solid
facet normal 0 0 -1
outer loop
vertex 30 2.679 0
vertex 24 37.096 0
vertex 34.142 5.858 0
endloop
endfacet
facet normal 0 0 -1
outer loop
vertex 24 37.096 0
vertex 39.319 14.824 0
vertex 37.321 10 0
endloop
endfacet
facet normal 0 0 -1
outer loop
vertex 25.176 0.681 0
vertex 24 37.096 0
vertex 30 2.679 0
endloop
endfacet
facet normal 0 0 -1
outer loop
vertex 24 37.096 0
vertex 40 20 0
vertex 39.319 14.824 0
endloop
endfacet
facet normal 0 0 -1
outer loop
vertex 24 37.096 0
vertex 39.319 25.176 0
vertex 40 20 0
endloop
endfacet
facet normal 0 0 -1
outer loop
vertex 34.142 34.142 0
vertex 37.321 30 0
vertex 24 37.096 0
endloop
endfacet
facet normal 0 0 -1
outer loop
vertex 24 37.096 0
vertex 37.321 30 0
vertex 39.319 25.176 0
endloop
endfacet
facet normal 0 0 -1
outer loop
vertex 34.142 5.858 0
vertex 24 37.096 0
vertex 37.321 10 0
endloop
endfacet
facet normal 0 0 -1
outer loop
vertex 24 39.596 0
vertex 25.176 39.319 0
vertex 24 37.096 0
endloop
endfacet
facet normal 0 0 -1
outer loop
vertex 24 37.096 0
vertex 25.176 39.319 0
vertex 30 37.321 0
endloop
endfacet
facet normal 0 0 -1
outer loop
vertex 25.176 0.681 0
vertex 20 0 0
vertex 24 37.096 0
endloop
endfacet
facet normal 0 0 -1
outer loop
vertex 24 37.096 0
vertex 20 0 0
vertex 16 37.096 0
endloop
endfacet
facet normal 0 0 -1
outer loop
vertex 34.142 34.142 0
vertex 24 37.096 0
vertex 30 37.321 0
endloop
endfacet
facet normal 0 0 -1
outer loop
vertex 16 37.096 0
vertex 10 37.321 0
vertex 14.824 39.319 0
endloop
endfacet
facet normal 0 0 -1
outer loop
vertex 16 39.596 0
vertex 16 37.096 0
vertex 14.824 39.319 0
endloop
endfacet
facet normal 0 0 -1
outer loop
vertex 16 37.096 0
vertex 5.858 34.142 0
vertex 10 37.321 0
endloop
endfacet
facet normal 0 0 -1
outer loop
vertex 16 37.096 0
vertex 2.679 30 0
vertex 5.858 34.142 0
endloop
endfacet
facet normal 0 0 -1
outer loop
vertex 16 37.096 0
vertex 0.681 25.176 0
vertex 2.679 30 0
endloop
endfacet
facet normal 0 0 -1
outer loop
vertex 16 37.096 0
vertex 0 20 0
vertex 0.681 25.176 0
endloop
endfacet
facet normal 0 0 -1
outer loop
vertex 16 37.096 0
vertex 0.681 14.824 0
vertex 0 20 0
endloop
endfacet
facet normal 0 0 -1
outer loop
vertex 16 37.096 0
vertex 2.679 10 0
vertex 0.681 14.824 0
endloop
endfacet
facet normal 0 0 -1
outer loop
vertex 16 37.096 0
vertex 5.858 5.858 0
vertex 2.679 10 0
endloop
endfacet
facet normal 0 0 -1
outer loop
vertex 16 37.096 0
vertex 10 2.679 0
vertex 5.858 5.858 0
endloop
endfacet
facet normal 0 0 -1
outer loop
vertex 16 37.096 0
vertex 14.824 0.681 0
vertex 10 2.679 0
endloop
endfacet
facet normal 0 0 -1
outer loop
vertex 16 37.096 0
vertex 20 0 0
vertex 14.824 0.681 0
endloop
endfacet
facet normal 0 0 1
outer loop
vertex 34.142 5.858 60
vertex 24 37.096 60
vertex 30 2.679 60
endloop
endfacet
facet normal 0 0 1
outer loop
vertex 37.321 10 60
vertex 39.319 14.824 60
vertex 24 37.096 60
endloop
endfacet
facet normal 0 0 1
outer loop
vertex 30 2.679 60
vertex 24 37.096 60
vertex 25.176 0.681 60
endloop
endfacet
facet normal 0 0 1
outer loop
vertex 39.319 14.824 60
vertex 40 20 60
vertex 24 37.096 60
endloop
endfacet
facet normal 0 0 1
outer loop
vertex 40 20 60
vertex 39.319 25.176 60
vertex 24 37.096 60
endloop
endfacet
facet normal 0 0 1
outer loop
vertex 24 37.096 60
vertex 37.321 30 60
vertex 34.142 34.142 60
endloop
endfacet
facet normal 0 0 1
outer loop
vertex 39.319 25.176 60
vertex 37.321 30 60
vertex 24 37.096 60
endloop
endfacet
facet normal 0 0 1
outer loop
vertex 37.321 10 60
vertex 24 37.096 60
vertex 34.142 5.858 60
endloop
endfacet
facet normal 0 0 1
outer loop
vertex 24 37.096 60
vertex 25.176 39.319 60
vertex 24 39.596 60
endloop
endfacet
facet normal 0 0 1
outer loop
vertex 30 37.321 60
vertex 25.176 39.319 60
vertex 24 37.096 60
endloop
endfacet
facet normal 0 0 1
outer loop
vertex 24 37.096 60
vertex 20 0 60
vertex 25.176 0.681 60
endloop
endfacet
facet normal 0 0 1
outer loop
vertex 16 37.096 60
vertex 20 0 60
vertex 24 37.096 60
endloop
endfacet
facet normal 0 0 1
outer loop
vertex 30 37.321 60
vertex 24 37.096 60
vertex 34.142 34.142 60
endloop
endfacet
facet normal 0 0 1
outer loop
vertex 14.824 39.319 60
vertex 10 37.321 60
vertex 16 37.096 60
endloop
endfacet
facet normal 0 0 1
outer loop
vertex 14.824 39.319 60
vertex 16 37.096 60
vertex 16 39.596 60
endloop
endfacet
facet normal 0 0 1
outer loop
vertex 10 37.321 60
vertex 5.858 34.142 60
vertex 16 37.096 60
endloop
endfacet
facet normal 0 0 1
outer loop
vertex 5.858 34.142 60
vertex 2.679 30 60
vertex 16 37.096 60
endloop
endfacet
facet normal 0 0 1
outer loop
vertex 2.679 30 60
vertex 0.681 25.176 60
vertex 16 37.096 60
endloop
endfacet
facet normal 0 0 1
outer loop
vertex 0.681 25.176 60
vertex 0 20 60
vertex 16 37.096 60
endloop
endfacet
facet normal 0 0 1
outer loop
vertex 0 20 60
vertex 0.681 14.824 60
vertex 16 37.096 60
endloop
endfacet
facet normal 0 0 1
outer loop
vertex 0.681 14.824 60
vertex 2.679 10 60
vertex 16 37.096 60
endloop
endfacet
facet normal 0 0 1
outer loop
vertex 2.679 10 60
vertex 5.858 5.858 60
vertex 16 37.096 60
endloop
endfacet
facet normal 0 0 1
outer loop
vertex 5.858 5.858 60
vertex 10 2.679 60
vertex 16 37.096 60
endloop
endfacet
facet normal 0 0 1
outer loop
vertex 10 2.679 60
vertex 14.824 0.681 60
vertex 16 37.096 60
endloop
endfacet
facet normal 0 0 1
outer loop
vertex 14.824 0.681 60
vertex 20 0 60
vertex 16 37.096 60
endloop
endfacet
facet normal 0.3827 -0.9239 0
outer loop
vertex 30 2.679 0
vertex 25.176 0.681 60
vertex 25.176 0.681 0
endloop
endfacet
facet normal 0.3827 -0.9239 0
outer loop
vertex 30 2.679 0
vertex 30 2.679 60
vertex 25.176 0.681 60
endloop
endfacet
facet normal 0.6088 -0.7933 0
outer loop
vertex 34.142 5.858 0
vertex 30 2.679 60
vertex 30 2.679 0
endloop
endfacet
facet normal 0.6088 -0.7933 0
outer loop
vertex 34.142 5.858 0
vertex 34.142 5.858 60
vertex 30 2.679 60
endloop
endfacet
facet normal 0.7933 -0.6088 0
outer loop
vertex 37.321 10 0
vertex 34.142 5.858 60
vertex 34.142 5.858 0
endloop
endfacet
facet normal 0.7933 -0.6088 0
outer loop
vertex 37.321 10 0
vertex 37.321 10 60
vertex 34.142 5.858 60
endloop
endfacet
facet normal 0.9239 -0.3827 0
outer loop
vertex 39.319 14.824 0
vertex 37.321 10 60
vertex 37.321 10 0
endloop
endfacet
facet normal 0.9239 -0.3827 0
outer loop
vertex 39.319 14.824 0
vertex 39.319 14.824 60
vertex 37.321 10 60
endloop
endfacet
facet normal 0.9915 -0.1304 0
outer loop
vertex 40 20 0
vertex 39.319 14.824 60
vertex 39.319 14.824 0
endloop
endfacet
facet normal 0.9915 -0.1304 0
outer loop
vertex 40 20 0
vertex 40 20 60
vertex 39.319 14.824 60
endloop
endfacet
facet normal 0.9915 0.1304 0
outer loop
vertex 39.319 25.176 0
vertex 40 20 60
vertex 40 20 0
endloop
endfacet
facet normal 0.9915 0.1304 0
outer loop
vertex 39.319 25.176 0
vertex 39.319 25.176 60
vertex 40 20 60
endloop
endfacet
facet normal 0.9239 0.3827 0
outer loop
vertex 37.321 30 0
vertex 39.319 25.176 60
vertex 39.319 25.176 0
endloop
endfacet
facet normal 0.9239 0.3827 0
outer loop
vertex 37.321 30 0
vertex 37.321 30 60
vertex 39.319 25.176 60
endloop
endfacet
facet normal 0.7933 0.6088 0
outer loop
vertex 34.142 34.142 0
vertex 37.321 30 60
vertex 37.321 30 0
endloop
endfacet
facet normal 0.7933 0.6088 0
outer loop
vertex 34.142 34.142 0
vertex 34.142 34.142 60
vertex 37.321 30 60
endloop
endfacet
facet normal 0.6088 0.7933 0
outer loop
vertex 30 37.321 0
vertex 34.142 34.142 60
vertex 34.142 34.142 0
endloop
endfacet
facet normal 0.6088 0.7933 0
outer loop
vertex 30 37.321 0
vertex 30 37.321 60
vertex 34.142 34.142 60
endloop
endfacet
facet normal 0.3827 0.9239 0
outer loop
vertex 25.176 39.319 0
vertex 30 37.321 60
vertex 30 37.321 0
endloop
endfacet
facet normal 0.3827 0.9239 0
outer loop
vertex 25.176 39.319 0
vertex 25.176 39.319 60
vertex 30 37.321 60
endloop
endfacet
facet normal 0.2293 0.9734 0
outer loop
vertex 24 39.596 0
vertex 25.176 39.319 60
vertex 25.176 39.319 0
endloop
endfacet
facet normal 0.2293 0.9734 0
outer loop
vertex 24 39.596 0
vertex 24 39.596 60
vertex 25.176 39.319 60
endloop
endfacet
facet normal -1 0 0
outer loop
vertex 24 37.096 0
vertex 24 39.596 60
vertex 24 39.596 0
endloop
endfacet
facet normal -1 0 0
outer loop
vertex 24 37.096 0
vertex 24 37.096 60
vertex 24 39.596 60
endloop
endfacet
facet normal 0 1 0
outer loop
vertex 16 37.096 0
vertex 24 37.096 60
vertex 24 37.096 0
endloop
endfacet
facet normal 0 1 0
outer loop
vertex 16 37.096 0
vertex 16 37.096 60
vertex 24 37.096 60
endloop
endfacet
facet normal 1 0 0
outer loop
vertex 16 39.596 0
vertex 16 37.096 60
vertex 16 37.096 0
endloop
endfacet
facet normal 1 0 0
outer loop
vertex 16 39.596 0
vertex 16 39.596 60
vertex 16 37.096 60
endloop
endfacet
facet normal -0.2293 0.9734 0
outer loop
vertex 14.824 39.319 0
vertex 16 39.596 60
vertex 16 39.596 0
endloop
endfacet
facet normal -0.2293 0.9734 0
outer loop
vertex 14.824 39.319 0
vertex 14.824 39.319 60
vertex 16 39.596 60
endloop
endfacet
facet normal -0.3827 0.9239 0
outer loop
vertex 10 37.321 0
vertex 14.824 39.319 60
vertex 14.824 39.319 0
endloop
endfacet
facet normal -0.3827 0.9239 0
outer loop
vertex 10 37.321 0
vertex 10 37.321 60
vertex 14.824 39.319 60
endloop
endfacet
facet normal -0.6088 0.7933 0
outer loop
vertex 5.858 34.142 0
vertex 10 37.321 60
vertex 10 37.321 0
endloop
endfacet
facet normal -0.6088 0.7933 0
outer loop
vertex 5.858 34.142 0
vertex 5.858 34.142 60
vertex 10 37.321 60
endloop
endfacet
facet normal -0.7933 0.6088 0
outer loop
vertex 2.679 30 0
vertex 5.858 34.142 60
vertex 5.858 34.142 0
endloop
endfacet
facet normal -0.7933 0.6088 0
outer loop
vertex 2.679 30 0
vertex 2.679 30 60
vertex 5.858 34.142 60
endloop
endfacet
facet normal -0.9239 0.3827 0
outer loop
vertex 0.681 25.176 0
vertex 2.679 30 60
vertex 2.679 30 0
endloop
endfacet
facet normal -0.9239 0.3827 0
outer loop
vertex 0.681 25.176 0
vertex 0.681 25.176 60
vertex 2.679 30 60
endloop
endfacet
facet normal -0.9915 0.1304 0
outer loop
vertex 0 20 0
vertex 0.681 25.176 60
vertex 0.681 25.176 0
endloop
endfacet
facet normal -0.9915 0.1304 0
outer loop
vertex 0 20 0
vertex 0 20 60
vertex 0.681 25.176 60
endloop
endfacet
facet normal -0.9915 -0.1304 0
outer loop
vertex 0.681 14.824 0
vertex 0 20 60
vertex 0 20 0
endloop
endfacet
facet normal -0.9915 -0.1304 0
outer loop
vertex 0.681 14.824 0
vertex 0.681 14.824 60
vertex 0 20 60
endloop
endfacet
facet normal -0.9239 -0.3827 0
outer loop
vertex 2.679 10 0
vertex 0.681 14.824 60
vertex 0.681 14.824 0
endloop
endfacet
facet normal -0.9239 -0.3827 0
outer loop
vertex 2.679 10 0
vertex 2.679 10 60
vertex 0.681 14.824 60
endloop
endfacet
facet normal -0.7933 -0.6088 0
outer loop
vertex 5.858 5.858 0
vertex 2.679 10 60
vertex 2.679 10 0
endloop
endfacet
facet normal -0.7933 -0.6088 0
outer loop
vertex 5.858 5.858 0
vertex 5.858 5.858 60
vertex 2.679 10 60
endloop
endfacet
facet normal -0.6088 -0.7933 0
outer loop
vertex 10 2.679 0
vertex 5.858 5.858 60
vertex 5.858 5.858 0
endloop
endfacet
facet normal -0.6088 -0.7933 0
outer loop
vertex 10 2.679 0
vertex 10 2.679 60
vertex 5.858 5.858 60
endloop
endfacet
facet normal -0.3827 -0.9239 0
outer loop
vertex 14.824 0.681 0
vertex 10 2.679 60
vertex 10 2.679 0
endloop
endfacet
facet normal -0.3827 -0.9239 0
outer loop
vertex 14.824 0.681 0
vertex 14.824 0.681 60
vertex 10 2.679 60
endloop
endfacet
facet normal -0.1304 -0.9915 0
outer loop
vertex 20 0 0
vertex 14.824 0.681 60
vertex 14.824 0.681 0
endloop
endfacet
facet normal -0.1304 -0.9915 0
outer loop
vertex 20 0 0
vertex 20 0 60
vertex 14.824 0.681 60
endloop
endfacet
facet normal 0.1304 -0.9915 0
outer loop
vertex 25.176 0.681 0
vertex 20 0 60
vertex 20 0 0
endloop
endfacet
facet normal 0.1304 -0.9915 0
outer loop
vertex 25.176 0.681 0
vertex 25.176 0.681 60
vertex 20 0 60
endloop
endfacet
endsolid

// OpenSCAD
$fn = 32;

// ----------------------------------------------------------------------
// Keyway shaft: d40 shaft, key 8 x 2.5 mm
// ----------------------------------------------------------------------

// --- parameters (mm) ---
shaft_r = 20;             // shaft radius
key_w = 8;                // keyway width
key_d = 2.5;              // keyway depth below the surface line
plate_t = 60;             // shaft length, Z (extrusion height)
fit_tol = 0.1;            // declared fit tolerance (prompt contract)
free_tol = 0.3;           // declared free tolerance (prompt contract)

shaft_d = 2 * shaft_r;  // shaft diameter
circle_step = 15;  // polygon sampling step, degrees

profile = [[14.824, 39.319], [10, 37.321], [5.858, 34.142], [2.679, 30], [0.681, 25.176], [0, 20], [0.681, 14.824], [2.679, 10], [5.858, 5.858], [10, 2.679], [14.824, 0.681], [20, 0], [25.176, 0.681], [30, 2.679], [34.142, 5.858], [37.321, 10], [39.319, 14.824], [40, 20], [39.319, 25.176], [37.321, 30], [34.142, 34.142], [30, 37.321], [25.176, 39.319], [24, 39.596], [24, 37.096], [16, 37.096], [16, 39.596]];  // primary outline, 27 points, counter clockwise

// --- the one profile operation ---
linear_extrude(height = plate_t) polygon(points = profile);
